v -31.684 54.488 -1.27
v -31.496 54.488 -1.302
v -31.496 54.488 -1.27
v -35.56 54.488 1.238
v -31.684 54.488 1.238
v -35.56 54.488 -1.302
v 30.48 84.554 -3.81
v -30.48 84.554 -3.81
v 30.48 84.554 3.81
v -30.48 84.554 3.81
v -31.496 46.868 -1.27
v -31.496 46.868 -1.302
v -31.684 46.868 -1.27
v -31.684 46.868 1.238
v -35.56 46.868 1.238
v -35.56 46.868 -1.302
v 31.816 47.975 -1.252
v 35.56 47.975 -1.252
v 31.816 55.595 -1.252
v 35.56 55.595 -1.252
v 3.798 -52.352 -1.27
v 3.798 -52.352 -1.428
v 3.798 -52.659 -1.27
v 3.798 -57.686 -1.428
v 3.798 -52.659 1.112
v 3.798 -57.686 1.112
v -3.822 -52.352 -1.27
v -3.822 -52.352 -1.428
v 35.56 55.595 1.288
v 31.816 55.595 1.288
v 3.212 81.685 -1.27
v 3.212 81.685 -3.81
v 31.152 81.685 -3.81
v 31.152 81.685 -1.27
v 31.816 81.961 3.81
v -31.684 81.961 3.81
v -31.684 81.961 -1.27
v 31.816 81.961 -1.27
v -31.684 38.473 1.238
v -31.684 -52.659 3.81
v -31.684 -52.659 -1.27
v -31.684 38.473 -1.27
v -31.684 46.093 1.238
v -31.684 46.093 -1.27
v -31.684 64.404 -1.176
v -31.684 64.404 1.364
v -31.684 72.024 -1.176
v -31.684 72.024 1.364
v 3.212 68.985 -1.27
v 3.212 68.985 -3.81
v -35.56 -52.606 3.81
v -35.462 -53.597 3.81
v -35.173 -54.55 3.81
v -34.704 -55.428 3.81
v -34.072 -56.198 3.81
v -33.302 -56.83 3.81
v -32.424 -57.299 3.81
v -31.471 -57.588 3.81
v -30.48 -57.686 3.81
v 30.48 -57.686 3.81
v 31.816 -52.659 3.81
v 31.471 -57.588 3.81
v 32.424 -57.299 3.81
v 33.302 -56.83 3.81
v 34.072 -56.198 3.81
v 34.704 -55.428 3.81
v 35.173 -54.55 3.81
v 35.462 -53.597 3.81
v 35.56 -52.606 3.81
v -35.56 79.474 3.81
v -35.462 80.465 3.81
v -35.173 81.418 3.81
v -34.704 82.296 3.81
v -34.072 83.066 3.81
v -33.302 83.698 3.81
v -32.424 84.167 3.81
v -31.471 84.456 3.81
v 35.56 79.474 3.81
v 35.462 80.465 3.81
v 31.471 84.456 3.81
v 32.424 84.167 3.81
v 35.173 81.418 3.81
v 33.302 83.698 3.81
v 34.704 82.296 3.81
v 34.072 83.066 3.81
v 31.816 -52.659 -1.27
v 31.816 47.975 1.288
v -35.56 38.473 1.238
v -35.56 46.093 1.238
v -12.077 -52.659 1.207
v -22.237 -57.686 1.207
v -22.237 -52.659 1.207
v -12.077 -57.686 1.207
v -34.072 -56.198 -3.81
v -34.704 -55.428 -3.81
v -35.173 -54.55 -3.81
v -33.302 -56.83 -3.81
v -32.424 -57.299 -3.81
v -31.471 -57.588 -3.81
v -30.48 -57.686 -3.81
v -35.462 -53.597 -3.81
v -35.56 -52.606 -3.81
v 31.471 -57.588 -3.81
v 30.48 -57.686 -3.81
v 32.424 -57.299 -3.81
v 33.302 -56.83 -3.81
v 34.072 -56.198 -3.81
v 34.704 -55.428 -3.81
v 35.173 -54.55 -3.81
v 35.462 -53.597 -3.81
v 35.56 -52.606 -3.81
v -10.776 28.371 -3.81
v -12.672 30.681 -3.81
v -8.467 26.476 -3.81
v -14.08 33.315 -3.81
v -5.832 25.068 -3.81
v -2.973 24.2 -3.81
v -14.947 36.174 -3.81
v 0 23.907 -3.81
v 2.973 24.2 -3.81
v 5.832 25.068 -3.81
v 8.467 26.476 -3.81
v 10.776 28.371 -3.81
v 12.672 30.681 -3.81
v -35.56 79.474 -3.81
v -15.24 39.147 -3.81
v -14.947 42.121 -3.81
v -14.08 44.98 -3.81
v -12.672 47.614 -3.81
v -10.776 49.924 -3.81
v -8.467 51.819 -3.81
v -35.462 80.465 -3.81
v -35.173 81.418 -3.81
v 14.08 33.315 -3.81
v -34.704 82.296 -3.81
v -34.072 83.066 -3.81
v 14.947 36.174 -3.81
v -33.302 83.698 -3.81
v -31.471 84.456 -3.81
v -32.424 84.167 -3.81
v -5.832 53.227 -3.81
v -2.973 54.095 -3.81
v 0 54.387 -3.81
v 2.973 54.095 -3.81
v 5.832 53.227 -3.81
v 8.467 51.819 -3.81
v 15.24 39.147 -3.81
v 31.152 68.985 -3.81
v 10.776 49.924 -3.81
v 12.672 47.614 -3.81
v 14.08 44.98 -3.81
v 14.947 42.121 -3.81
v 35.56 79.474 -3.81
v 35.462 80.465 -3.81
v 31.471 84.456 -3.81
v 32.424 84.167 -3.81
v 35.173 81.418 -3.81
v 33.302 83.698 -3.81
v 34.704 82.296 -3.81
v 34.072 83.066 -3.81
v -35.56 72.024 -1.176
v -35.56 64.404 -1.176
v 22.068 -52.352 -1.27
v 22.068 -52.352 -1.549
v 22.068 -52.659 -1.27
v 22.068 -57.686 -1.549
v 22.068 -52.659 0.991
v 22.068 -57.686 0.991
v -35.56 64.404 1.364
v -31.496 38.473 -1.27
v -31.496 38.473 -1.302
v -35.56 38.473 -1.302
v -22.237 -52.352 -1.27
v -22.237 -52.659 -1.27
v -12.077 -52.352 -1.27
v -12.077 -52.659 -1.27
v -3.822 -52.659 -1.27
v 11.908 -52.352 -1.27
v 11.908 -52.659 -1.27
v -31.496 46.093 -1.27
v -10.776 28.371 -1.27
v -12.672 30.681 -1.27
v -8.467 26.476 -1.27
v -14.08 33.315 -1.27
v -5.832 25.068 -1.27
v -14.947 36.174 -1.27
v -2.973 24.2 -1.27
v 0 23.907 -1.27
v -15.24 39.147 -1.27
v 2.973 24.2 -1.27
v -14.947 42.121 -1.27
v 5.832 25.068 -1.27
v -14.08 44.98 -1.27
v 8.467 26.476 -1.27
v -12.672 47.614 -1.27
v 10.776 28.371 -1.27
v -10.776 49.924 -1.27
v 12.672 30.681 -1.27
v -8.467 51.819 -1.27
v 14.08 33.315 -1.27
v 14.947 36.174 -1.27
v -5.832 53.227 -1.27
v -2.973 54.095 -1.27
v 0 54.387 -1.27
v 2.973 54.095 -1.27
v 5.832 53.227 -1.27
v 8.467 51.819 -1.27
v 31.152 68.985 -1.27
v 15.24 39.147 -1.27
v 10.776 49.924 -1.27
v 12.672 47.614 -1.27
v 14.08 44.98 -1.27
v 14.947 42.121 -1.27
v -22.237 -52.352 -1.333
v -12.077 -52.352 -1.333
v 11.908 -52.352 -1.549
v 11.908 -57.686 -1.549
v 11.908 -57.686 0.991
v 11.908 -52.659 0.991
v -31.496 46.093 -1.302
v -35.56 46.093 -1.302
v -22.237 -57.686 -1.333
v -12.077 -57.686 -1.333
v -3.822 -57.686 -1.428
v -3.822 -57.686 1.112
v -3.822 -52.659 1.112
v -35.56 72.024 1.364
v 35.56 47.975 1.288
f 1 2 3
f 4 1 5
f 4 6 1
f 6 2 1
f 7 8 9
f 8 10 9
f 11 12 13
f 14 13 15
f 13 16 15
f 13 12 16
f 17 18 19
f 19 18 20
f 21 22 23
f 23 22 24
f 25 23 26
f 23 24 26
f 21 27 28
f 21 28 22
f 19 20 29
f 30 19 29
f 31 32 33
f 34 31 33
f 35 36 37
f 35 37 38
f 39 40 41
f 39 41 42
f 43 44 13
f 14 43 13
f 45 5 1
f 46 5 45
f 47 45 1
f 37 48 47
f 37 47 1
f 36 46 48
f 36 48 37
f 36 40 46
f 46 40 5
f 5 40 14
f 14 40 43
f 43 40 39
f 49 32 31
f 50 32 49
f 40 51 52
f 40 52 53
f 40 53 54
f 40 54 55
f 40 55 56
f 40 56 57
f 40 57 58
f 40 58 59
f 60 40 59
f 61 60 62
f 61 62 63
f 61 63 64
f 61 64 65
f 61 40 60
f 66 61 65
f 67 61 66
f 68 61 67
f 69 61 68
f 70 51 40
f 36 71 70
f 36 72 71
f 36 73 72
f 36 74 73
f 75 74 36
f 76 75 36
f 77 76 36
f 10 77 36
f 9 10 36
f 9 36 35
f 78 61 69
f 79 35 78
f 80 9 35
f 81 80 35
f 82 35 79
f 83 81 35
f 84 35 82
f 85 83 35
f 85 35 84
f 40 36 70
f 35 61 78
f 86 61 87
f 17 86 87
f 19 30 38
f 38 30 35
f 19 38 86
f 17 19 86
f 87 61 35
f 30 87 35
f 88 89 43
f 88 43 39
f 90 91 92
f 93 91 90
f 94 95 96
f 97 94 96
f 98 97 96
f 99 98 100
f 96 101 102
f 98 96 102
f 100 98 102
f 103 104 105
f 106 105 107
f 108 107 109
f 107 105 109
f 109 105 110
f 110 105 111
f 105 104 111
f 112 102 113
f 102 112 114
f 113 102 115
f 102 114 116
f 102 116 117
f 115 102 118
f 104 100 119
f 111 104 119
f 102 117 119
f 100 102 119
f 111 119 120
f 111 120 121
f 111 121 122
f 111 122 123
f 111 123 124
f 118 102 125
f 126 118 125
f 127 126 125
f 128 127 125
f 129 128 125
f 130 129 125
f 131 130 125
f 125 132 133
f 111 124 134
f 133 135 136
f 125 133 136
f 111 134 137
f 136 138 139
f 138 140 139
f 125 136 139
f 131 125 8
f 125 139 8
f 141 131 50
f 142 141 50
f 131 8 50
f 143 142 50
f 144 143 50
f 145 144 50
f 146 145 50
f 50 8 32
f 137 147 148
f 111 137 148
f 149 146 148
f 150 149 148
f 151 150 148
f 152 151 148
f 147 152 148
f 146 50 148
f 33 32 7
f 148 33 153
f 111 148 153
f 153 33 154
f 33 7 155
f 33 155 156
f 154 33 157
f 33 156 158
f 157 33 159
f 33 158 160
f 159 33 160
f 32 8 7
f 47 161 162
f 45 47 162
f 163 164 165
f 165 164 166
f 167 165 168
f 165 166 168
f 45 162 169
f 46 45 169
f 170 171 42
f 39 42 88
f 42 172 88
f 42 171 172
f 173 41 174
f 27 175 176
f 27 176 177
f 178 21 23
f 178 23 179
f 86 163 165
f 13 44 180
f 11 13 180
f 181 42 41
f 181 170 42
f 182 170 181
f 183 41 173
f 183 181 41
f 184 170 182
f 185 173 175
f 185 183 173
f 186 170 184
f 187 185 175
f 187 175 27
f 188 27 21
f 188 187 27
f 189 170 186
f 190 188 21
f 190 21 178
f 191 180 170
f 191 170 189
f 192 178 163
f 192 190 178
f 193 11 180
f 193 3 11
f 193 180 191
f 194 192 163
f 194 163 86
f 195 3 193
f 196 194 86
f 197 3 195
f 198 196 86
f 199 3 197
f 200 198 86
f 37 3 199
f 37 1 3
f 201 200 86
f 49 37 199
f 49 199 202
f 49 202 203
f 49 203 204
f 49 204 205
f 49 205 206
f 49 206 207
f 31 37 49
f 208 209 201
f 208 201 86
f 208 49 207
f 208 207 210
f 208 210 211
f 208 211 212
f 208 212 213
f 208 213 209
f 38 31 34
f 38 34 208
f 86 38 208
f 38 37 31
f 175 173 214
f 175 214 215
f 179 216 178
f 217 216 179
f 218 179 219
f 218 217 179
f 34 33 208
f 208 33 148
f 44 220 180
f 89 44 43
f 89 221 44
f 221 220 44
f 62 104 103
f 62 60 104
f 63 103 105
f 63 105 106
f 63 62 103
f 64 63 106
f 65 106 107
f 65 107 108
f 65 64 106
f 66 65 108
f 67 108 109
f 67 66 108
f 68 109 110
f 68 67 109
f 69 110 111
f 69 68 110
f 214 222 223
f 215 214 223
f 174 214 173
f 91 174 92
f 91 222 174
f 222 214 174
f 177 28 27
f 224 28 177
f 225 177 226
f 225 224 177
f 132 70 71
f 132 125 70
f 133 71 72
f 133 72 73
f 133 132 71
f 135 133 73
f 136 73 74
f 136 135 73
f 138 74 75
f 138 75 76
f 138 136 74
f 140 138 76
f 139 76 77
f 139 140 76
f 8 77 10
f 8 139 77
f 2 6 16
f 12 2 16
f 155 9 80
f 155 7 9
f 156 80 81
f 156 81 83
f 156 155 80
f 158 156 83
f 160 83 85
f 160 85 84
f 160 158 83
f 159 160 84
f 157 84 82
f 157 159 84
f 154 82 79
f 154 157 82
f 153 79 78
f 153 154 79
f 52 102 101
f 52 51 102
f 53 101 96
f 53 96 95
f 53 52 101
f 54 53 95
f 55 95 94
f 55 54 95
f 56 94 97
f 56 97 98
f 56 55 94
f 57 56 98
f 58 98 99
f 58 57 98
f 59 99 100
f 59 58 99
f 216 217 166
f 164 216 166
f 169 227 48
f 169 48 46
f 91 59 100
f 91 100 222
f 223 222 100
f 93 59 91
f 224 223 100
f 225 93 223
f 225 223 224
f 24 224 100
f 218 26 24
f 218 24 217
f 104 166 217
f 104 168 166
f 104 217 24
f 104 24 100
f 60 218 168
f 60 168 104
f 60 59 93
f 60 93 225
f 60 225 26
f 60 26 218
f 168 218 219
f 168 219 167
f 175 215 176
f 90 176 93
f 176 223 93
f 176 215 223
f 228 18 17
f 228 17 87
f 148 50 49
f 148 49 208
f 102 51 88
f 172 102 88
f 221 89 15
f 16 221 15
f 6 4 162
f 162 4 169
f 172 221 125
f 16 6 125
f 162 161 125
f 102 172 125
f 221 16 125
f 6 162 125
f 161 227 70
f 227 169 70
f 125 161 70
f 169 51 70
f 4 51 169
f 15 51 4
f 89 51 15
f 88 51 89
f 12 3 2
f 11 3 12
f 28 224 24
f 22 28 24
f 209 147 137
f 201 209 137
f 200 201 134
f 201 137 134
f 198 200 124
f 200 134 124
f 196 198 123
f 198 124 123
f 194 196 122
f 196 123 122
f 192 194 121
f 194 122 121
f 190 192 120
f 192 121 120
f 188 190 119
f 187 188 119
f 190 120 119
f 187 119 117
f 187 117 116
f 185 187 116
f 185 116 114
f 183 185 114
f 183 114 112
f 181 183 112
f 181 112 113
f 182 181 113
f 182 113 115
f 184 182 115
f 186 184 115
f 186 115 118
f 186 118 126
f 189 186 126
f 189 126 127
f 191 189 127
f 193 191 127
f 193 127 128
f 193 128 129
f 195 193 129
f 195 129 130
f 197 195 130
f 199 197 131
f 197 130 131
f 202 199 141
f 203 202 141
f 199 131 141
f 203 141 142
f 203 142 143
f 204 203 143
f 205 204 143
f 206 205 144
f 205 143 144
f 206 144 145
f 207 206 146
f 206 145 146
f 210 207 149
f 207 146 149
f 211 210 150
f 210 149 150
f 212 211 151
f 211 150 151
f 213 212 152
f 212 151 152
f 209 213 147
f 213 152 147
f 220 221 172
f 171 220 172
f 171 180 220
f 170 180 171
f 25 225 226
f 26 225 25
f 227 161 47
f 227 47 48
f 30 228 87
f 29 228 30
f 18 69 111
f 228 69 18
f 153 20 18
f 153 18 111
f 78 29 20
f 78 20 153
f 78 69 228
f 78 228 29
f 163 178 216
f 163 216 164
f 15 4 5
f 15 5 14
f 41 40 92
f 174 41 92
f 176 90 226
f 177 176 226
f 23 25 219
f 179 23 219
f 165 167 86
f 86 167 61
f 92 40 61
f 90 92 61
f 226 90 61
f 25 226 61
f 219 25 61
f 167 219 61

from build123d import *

# Parameters (mm, degrees)
F0_W      = 71.12
F0_H      = 142.24
F1_DEPTH  = 3.81
F2_W      = 63.5
F2_H      = 134.62
F3_DEPTH  = 5.08
F4_W      = 10.16
F4_H      = 2.54
F5_DEPTH  = 5.334
F6_W      = 7.62
F6_H      = 2.54
F7_DEPTH  = 5.334
F8_W      = 7.62
F8_H      = 2.54
F9_DEPTH  = 4.572
F10_W     = 7.62
F10_H     = 2.54
F11_DEPTH = 4.064
F12_W     = 7.62
F12_H     = 2.54
F13_DEPTH = 4.064
F14_W     = 27.94
F14_H     = 12.7
F15_DEPTH = 4.064
F16_R     = 15.24
F17_DEPTH = 4.064
F18_R     = 5.08


with BuildPart() as f1:
    # F0 (on Top) → F1 (new body, symmetric)
    with BuildSketch(Plane.XY):
        with Locations((0, 13.4339)):
            Rectangle(F0_W, F0_H)
    extrude(amount=F1_DEPTH, both=True)

    # F2 (on face) → F3 (cut)
    with BuildSketch(Plane.XY.offset(3.81)):
        with Locations((0.065597, 14.650529)):
            Rectangle(F2_W, F2_H)
    extrude(amount=-F3_DEPTH, mode=Mode.SUBTRACT)

    # F4 (on face) → F5 (cut)
    with BuildSketch(Plane.XZ.offset(57.6861)):
        with Locations((-17.157398, -0.062746)):
            Rectangle(F4_W, F4_H)
        with Locations((16.987846, -0.278907)):
            Rectangle(F4_W, F4_H)
    extrude(amount=-F5_DEPTH, mode=Mode.SUBTRACT)

    # F6 (on face) → F7 (cut)
    with BuildSketch(Plane.XZ.offset(57.6861)):
        with Locations((-0.01244, -0.158032)):
            Rectangle(F6_W, F6_H)
    extrude(amount=-F7_DEPTH, mode=Mode.SUBTRACT)

    # F8 (on face) → F9 (cut)
    with BuildSketch(Plane.YZ.offset(35.56)):
        with Locations((51.784515, 0.018215)):
            Rectangle(F8_W, F8_H)
    extrude(amount=-F9_DEPTH, mode=Mode.SUBTRACT)

    # F10 (on face) → F11 (cut)
    with BuildSketch(Plane(origin=(-35.56, 0, 0), x_dir=(0, -1, 0), z_dir=(-1, 0, 0))):
        with Locations((-68.214123, 0.094177)):
            Rectangle(F10_W, F10_H)
    extrude(amount=-F11_DEPTH, mode=Mode.SUBTRACT)

    # F12 (on face) → F13 (cut)
    with BuildSketch(Plane(origin=(-35.56, 0, 0), x_dir=(0, -1, 0), z_dir=(-1, 0, 0))):
        with Locations((-50.678022, -0.031994)):
            Rectangle(F12_W, F12_H)
        with Locations((-42.283158, -0.031994)):
            Rectangle(F12_W, F12_H)
    extrude(amount=-F13_DEPTH, mode=Mode.SUBTRACT)

    # F14 (on face) → F15 (cut)
    with BuildSketch(Plane(origin=(0, 0, -3.81), x_dir=(1, 0, 0), z_dir=(0, 0, -1))):
        with Locations((17.181641, -75.335267)):
            Rectangle(F14_W, F14_H)
    extrude(amount=-F15_DEPTH, mode=Mode.SUBTRACT)

    # F16 (on face) → F17 (cut)
    with BuildSketch(Plane(origin=(0, 0, -3.81), x_dir=(1, 0, 0), z_dir=(0, 0, -1))):
        with Locations((0, -39.147473)):
            Circle(F16_R)
    extrude(amount=-F17_DEPTH, mode=Mode.SUBTRACT)

    # F18
    f18_edges = [f1.edges().sort_by_distance(p)[0] for p in [
        (35.56, -57.6861, 0),
        (-35.56, -57.6861, 0),
        (-35.56, 84.5539, 0),
        (35.56, 84.5539, 0),
    ]]
    fillet(f18_edges, radius=F18_R)


solid = f1.part
